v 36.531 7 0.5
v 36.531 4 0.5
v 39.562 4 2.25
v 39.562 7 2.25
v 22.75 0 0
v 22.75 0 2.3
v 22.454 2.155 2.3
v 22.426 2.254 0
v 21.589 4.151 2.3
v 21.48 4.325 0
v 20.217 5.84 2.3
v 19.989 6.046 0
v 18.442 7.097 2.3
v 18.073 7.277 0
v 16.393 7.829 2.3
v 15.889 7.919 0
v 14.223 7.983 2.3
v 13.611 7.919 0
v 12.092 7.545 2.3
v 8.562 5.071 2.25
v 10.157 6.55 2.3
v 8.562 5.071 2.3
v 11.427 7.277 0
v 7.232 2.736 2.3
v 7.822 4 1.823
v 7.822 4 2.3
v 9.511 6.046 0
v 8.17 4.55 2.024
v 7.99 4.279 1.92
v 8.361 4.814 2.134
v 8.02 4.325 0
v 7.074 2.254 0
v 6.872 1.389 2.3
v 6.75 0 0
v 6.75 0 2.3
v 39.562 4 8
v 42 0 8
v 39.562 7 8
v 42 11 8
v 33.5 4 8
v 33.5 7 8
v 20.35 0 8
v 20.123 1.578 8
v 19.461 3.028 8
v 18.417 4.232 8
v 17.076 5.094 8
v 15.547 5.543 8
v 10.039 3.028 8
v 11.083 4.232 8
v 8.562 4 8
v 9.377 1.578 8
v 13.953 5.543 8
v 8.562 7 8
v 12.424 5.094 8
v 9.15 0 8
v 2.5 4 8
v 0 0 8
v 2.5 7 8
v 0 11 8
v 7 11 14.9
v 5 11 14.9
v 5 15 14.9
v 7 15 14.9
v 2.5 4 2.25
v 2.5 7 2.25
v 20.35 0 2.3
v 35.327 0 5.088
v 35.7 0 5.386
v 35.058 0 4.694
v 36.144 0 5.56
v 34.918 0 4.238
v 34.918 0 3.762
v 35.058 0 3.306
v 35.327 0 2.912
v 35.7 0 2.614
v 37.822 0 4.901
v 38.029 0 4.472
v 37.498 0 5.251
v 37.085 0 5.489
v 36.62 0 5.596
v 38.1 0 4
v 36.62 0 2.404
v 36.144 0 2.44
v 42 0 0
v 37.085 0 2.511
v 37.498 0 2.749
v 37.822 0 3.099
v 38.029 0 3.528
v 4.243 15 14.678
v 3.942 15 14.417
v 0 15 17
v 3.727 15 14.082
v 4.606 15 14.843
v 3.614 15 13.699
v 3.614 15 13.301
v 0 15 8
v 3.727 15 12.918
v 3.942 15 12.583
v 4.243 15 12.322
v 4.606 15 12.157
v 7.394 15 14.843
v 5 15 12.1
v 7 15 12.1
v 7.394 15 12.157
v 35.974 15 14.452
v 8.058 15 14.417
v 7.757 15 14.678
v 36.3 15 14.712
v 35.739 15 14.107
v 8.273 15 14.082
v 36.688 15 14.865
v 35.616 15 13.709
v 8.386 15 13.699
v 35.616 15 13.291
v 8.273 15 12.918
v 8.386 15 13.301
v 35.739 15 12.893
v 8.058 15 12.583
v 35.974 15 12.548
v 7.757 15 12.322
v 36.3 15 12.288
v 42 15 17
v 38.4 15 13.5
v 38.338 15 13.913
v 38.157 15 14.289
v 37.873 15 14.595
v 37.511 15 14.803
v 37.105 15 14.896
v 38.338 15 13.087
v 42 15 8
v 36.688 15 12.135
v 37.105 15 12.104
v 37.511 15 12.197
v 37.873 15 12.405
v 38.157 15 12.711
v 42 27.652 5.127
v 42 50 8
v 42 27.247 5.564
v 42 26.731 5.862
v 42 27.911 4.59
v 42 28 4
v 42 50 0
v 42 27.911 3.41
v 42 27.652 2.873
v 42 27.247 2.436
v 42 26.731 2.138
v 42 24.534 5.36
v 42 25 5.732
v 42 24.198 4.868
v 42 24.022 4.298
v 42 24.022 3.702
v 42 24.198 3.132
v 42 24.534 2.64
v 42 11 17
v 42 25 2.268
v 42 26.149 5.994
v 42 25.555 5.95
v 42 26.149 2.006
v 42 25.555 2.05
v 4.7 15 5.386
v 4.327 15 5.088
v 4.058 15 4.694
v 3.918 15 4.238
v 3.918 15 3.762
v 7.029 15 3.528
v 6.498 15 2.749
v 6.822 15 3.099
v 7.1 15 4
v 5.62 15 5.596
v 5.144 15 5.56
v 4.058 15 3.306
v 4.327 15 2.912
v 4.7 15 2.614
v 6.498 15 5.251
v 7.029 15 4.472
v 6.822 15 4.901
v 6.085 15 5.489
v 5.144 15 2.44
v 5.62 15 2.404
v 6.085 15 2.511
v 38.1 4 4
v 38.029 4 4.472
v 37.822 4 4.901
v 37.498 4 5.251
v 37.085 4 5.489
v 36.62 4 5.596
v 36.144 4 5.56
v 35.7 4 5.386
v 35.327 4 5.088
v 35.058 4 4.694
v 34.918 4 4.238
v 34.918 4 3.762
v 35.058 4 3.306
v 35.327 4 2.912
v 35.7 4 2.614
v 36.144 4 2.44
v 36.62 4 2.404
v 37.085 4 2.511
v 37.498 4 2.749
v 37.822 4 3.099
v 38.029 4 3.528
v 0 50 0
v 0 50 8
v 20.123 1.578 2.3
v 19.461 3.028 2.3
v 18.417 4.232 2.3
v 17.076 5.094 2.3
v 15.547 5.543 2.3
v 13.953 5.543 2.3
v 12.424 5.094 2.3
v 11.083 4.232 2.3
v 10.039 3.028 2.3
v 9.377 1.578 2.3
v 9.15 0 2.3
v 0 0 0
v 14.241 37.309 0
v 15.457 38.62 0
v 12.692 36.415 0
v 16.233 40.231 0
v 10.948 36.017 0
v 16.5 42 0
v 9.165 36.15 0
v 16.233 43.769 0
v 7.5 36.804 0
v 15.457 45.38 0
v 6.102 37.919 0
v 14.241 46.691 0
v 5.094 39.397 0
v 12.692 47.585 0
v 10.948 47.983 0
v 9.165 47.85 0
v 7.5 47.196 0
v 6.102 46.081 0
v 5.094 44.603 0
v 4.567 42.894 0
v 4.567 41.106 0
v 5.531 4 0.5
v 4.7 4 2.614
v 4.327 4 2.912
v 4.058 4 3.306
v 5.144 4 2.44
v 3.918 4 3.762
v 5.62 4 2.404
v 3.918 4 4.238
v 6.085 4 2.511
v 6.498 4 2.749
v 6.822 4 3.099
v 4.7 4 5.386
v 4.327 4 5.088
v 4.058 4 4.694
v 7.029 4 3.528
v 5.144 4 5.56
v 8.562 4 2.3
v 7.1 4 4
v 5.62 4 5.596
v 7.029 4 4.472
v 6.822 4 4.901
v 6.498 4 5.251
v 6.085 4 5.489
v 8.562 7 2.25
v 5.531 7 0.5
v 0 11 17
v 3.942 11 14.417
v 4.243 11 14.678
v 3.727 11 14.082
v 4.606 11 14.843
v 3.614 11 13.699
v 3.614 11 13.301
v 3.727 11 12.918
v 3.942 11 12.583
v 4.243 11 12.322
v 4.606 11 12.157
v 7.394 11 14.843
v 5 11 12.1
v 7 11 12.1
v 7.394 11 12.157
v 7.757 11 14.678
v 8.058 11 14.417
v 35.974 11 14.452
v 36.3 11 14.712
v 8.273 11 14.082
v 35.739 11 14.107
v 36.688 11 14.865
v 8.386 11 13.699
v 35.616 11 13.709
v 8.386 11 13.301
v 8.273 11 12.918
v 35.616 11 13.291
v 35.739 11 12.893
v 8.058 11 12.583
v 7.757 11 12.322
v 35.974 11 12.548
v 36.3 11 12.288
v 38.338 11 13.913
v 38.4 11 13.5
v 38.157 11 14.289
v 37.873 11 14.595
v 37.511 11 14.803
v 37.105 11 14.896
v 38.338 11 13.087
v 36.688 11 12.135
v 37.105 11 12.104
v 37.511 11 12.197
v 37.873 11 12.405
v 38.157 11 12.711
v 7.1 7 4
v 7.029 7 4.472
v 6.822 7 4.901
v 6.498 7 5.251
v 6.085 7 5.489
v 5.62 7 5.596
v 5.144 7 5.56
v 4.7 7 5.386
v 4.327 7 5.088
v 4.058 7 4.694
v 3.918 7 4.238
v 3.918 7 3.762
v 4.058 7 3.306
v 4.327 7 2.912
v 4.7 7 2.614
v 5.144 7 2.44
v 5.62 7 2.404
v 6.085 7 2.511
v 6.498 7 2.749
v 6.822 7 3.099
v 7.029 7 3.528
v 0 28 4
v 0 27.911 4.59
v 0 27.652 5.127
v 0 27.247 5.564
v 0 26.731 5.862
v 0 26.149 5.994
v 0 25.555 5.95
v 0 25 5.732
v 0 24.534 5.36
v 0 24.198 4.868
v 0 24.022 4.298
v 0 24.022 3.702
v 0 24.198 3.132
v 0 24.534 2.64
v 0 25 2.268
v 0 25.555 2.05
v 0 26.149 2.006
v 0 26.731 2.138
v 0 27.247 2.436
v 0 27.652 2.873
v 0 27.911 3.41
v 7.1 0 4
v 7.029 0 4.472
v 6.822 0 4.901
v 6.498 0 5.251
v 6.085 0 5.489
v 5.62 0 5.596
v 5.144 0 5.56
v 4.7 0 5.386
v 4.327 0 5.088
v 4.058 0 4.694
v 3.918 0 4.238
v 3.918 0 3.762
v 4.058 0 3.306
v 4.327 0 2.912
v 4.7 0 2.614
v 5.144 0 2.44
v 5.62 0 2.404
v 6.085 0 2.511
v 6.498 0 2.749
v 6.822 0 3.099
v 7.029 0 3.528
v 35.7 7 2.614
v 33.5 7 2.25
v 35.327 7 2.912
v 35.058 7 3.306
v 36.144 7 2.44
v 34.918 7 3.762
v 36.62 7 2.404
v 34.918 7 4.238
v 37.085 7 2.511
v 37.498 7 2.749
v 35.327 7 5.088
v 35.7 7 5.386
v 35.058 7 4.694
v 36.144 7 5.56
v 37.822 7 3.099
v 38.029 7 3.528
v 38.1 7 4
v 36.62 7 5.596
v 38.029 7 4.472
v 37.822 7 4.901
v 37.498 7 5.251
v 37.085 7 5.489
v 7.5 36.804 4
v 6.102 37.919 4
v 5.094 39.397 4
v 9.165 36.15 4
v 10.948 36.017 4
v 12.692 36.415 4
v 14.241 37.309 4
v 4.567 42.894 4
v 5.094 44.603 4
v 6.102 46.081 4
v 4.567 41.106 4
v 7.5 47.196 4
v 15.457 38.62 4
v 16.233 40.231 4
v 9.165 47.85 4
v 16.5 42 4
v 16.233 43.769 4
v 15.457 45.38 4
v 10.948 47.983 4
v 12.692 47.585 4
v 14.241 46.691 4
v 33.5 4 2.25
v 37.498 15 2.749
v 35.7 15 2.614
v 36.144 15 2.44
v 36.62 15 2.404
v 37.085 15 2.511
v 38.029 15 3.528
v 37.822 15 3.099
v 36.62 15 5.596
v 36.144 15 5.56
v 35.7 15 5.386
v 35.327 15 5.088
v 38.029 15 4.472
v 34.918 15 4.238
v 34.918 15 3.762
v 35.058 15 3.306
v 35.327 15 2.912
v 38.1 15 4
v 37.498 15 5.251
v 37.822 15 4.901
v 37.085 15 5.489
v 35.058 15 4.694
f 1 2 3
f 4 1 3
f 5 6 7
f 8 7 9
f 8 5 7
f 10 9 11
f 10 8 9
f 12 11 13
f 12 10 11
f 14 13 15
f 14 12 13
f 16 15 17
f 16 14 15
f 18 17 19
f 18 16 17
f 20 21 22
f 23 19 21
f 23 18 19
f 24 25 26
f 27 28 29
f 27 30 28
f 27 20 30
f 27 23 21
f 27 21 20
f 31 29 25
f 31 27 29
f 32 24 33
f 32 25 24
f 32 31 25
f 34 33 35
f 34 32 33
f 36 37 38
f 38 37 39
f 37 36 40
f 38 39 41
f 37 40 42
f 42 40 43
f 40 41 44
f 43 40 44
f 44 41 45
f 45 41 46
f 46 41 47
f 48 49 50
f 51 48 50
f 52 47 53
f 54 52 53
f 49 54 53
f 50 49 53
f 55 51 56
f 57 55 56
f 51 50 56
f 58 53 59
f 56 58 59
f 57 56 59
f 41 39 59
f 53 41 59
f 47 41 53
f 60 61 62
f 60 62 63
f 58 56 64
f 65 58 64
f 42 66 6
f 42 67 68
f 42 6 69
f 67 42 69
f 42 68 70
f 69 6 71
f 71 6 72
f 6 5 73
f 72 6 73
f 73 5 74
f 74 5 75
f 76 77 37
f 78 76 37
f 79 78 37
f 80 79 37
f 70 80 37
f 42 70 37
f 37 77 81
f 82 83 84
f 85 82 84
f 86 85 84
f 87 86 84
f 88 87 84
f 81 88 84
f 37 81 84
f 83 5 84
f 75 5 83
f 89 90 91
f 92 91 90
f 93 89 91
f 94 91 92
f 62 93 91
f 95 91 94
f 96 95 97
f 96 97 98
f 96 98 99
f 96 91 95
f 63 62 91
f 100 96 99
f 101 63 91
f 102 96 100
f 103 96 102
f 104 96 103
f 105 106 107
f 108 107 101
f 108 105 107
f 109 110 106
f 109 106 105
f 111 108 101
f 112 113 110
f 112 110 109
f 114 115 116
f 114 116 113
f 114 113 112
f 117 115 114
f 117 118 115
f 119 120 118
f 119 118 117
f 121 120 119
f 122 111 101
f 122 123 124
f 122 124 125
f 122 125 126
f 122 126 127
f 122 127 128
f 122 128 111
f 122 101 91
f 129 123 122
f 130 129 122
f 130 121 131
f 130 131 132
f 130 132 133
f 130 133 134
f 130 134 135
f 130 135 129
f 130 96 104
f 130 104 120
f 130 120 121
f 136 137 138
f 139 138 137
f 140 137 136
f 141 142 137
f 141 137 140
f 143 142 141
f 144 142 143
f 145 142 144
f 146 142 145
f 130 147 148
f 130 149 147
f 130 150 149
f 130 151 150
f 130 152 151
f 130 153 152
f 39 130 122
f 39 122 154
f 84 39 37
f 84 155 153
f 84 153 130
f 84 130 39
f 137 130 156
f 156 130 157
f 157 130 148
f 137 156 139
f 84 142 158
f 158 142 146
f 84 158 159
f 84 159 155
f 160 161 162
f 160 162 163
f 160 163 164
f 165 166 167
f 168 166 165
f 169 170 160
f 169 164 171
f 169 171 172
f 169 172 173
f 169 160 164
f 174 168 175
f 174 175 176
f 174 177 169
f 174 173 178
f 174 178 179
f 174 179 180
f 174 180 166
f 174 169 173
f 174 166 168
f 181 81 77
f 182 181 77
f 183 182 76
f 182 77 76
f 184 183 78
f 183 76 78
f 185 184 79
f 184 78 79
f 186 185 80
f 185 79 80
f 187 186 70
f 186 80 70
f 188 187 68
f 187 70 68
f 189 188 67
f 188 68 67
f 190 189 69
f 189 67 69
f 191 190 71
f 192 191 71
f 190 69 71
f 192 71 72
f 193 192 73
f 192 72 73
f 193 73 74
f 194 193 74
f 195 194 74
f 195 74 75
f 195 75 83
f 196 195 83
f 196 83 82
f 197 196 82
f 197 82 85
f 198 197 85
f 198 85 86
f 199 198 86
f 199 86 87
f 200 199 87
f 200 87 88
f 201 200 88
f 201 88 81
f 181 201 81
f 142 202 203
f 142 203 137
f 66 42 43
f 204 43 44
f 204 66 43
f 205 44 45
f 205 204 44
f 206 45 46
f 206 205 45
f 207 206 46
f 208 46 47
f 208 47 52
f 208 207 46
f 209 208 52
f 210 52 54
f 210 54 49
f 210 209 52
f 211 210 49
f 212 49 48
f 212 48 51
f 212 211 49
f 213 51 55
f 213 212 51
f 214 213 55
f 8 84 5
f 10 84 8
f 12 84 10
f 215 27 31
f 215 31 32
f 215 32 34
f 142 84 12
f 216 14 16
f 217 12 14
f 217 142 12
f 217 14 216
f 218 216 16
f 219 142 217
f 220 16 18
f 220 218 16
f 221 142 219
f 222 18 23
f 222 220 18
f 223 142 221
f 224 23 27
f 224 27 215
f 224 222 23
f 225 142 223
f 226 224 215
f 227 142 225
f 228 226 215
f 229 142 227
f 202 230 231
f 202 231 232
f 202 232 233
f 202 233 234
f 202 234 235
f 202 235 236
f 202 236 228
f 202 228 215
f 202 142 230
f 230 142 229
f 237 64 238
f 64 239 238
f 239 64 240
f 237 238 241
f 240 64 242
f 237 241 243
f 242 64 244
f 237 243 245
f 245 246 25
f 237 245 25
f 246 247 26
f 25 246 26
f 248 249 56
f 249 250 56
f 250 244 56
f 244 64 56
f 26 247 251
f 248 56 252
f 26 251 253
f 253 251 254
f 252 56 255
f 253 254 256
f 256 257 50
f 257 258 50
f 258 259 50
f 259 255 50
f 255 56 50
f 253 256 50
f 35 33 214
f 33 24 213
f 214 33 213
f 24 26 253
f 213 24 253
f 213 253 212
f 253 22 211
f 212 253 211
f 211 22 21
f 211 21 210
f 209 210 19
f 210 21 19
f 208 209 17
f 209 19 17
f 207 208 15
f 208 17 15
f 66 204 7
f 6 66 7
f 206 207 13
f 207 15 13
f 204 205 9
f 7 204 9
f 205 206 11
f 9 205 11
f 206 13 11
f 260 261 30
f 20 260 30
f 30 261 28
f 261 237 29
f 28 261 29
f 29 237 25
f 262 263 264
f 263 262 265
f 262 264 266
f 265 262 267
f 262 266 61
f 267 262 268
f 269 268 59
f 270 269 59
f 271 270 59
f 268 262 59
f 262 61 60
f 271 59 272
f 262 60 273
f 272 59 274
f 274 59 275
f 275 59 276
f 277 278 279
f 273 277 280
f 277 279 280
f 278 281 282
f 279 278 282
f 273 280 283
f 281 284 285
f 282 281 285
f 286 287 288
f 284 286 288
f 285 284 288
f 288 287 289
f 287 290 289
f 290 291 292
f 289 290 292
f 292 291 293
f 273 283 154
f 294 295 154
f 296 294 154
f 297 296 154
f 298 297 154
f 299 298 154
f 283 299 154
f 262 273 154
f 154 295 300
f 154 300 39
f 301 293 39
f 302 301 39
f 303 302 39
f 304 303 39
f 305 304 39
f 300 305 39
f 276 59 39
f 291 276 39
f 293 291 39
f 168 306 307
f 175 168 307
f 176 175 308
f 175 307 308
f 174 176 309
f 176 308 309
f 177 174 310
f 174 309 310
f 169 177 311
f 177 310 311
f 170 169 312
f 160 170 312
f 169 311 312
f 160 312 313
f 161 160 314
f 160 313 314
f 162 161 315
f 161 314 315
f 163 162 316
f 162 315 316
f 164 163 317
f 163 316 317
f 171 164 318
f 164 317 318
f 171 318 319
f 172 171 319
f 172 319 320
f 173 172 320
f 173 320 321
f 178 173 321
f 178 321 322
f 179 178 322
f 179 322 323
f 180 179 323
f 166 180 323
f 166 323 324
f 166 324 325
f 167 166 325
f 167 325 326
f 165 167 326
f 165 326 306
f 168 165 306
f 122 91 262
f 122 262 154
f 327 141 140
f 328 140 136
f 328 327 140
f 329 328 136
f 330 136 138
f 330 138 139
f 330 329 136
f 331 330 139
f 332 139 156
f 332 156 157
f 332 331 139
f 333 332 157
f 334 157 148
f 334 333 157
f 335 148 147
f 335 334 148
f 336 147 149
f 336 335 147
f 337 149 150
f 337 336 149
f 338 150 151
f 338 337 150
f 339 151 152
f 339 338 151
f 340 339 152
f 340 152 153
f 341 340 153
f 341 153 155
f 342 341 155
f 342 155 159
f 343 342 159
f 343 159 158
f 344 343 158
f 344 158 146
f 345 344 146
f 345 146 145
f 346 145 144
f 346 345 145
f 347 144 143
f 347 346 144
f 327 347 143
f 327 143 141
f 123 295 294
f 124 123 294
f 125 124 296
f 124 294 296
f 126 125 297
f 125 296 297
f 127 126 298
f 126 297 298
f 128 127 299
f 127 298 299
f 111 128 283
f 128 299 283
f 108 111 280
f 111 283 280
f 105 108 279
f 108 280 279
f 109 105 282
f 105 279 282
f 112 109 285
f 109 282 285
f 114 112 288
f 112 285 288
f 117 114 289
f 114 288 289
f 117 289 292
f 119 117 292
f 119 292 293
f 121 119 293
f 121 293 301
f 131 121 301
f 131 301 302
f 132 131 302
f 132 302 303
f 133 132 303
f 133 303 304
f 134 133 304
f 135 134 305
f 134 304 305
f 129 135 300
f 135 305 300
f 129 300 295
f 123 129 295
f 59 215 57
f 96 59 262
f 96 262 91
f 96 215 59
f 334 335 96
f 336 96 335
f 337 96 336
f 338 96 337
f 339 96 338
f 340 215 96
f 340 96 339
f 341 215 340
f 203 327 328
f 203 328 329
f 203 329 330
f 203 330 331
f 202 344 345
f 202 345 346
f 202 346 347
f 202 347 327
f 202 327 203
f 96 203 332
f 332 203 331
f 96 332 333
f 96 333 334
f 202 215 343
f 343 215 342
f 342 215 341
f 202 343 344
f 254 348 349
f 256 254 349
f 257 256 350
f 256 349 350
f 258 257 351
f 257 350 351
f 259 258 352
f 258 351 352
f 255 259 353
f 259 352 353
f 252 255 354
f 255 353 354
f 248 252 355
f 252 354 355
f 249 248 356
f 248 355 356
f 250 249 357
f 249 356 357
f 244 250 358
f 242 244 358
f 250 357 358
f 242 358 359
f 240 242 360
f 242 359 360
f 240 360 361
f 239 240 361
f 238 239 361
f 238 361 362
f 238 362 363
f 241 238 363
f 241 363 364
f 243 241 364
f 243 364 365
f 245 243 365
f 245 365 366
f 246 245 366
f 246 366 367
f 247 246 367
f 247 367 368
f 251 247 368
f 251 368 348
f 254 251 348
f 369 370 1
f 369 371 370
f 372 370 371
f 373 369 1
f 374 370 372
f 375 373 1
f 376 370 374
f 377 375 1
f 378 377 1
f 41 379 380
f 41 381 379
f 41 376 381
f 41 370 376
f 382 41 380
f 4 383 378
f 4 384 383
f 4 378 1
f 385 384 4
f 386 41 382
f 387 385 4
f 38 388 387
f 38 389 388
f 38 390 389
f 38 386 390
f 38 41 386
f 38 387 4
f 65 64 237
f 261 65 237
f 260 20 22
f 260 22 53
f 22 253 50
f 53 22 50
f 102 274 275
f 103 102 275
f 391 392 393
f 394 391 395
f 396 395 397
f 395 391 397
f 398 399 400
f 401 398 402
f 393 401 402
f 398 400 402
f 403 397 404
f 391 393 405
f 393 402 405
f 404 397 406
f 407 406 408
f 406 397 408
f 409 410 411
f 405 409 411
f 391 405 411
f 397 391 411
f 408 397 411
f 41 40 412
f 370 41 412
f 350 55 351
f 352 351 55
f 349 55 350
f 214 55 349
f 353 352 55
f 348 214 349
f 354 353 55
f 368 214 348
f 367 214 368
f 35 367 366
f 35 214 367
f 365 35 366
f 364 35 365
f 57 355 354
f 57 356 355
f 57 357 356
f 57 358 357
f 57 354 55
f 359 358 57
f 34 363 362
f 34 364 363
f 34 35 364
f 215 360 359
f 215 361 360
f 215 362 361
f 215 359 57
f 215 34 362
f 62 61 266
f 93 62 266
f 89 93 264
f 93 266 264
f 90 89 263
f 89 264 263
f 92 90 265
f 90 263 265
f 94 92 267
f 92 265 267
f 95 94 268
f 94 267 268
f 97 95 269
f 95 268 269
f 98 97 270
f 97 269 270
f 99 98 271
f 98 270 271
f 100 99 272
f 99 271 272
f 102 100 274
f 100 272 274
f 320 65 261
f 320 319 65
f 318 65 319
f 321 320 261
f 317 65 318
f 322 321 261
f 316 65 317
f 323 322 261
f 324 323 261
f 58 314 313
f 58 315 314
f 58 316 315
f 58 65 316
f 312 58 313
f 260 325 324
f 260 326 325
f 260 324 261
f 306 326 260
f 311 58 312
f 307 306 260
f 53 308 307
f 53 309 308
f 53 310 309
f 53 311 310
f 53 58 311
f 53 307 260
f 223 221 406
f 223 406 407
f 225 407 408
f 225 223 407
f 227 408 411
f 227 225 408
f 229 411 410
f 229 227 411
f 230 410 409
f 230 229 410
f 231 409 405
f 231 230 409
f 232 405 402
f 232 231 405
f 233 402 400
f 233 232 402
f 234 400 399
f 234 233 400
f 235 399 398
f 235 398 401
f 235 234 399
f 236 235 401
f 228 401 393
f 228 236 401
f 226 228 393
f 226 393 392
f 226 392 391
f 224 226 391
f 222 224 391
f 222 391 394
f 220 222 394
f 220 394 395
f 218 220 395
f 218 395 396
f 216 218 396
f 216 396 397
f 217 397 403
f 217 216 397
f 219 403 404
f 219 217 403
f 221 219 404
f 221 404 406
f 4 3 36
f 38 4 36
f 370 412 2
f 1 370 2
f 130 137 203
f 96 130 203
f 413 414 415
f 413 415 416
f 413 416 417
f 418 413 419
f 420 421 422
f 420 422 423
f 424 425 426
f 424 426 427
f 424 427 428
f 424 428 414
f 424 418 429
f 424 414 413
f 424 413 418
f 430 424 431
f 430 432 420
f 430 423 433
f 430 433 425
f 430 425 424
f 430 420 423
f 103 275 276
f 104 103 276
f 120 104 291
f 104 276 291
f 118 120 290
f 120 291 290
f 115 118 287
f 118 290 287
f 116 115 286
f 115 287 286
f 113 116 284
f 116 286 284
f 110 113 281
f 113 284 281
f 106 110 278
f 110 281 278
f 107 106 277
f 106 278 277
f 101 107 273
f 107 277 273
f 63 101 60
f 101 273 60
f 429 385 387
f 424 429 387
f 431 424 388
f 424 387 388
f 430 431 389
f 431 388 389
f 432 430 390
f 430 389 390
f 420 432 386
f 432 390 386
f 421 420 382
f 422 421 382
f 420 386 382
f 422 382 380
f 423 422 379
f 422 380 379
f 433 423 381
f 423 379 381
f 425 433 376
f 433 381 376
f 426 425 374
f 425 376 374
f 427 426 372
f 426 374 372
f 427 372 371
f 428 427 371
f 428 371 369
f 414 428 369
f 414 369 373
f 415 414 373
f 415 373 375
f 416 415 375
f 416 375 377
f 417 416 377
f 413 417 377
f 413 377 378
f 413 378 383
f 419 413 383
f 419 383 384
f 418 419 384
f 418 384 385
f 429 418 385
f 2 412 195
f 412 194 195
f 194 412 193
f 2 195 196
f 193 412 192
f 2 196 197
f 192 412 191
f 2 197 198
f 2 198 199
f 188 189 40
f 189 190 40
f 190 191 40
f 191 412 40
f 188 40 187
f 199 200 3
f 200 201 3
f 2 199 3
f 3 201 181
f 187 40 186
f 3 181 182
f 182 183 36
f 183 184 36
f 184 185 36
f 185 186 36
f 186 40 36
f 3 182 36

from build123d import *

# Parameters (mm, degrees)
PAD006_DEPTH = 3
SKETCH005_R  = 8
PAD005_DEPTH = 2.3
SKETCH004_R  = 6
PAD004_DEPTH = 4
SKETCH007_R  = 1.6
PAD007_DEPTH = 15
SKETCH003_R  = 1.4
PAD003_DEPTH = 4
SKETCH002_W  = 42
SKETCH002_H  = 4
PAD002_DEPTH = 9
SKETCH001_R  = 2
PAD001_DEPTH = 42
PAD_DEPTH    = 8


with BuildPart() as nutmount:
    # Sketch006 → Pad006 (new body)
    with BuildSketch(Plane.XZ.offset(-4)):
        Polygon((5.531089, 0.5), (8.562178, 2.25), (8.562178, 5.75), (8.562178, 8), (2.5, 8), (2.5, 5.75), (2.5, 2.25), align=None)
        Polygon((39.562178, 2.25), (39.562178, 5.75), (39.562178, 8), (33.5, 8), (33.5, 5.75), (33.5, 2.25), (36.531089, 0.5), align=None)
    extrude(amount=-PAD006_DEPTH)


with BuildPart() as hotendmount:
    # Sketch005 → Pad005 (new body)
    with BuildSketch(Plane.XY):
        with Locations((14.75, 0)):
            Circle(SKETCH005_R)
    extrude(amount=PAD005_DEPTH)


with BuildPart() as springmount:
    # Sketch004 → Pad004 (new body)
    with BuildSketch(Plane.XY):
        with Locations((10.5, 42)):
            Circle(SKETCH004_R)
    extrude(amount=PAD004_DEPTH)


with BuildPart() as hotendmount02:
    # Sketch007 → Pad007 (new body)
    with BuildSketch(Plane.XZ):
        with Locations((5.5, 4)):
            Circle(SKETCH007_R)
        with Locations((36.5, 4)):
            Circle(SKETCH007_R)
    extrude(amount=-PAD007_DEPTH)


with BuildPart() as cutblock:
    # Sketch003 → Pad003 (new body)
    with BuildSketch(Plane.XZ.offset(-11)):
        with Locations((37, 13.5)):
            Circle(SKETCH003_R)
        with BuildLine():
            ThreePointArc((5, 14.9), (3.6, 13.5), (5, 12.1))
            Line((5, 12.1), (7, 12.1))
            ThreePointArc((7, 12.1), (8.4, 13.5), (7, 14.9))
            Line((5, 14.9), (7, 14.9))
        make_face()
    extrude(amount=-PAD003_DEPTH)

    # Fusion001: union NutMount, HotEndMount, SpringMount, HotEndMount02
    add(nutmount.part)
    add(hotendmount.part)
    add(springmount.part)
    add(hotendmount02.part)


with BuildPart() as pad002:
    # Sketch002 → Pad002 (new body)
    with BuildSketch(Plane.XY.offset(8)):
        with Locations((21, 13)):
            Rectangle(SKETCH002_W, SKETCH002_H)
    extrude(amount=PAD002_DEPTH)


with BuildPart() as pad001:
    # Sketch001 → Pad001 (new body)
    with BuildSketch(Plane.YZ):
        with Locations((26, 4)):
            Circle(SKETCH001_R)
    extrude(amount=PAD001_DEPTH)


with BuildPart() as final:
    # Sketch → Pad (new body)
    with BuildSketch(Plane.XY):
        with BuildLine():
            Line((0, 50), (42, 50))
            Line((42, 50), (42, 0))
            Line((20.35, 0), (42, 0))
            ThreePointArc((20.35, 0), (14.75, 5.6), (9.15, 0))
            Line((9.15, 0), (0, 0))
            Line((0, 0), (0, 50))
        make_face()
    extrude(amount=PAD_DEPTH)

    # Cut: cut Pad001
    add(pad001.part, mode=Mode.SUBTRACT)

    # Fusion: union Pad002
    add(pad002.part)

    # Cut001: cut CutBlock
    add(cutblock.part, mode=Mode.SUBTRACT)


solid = final.part
